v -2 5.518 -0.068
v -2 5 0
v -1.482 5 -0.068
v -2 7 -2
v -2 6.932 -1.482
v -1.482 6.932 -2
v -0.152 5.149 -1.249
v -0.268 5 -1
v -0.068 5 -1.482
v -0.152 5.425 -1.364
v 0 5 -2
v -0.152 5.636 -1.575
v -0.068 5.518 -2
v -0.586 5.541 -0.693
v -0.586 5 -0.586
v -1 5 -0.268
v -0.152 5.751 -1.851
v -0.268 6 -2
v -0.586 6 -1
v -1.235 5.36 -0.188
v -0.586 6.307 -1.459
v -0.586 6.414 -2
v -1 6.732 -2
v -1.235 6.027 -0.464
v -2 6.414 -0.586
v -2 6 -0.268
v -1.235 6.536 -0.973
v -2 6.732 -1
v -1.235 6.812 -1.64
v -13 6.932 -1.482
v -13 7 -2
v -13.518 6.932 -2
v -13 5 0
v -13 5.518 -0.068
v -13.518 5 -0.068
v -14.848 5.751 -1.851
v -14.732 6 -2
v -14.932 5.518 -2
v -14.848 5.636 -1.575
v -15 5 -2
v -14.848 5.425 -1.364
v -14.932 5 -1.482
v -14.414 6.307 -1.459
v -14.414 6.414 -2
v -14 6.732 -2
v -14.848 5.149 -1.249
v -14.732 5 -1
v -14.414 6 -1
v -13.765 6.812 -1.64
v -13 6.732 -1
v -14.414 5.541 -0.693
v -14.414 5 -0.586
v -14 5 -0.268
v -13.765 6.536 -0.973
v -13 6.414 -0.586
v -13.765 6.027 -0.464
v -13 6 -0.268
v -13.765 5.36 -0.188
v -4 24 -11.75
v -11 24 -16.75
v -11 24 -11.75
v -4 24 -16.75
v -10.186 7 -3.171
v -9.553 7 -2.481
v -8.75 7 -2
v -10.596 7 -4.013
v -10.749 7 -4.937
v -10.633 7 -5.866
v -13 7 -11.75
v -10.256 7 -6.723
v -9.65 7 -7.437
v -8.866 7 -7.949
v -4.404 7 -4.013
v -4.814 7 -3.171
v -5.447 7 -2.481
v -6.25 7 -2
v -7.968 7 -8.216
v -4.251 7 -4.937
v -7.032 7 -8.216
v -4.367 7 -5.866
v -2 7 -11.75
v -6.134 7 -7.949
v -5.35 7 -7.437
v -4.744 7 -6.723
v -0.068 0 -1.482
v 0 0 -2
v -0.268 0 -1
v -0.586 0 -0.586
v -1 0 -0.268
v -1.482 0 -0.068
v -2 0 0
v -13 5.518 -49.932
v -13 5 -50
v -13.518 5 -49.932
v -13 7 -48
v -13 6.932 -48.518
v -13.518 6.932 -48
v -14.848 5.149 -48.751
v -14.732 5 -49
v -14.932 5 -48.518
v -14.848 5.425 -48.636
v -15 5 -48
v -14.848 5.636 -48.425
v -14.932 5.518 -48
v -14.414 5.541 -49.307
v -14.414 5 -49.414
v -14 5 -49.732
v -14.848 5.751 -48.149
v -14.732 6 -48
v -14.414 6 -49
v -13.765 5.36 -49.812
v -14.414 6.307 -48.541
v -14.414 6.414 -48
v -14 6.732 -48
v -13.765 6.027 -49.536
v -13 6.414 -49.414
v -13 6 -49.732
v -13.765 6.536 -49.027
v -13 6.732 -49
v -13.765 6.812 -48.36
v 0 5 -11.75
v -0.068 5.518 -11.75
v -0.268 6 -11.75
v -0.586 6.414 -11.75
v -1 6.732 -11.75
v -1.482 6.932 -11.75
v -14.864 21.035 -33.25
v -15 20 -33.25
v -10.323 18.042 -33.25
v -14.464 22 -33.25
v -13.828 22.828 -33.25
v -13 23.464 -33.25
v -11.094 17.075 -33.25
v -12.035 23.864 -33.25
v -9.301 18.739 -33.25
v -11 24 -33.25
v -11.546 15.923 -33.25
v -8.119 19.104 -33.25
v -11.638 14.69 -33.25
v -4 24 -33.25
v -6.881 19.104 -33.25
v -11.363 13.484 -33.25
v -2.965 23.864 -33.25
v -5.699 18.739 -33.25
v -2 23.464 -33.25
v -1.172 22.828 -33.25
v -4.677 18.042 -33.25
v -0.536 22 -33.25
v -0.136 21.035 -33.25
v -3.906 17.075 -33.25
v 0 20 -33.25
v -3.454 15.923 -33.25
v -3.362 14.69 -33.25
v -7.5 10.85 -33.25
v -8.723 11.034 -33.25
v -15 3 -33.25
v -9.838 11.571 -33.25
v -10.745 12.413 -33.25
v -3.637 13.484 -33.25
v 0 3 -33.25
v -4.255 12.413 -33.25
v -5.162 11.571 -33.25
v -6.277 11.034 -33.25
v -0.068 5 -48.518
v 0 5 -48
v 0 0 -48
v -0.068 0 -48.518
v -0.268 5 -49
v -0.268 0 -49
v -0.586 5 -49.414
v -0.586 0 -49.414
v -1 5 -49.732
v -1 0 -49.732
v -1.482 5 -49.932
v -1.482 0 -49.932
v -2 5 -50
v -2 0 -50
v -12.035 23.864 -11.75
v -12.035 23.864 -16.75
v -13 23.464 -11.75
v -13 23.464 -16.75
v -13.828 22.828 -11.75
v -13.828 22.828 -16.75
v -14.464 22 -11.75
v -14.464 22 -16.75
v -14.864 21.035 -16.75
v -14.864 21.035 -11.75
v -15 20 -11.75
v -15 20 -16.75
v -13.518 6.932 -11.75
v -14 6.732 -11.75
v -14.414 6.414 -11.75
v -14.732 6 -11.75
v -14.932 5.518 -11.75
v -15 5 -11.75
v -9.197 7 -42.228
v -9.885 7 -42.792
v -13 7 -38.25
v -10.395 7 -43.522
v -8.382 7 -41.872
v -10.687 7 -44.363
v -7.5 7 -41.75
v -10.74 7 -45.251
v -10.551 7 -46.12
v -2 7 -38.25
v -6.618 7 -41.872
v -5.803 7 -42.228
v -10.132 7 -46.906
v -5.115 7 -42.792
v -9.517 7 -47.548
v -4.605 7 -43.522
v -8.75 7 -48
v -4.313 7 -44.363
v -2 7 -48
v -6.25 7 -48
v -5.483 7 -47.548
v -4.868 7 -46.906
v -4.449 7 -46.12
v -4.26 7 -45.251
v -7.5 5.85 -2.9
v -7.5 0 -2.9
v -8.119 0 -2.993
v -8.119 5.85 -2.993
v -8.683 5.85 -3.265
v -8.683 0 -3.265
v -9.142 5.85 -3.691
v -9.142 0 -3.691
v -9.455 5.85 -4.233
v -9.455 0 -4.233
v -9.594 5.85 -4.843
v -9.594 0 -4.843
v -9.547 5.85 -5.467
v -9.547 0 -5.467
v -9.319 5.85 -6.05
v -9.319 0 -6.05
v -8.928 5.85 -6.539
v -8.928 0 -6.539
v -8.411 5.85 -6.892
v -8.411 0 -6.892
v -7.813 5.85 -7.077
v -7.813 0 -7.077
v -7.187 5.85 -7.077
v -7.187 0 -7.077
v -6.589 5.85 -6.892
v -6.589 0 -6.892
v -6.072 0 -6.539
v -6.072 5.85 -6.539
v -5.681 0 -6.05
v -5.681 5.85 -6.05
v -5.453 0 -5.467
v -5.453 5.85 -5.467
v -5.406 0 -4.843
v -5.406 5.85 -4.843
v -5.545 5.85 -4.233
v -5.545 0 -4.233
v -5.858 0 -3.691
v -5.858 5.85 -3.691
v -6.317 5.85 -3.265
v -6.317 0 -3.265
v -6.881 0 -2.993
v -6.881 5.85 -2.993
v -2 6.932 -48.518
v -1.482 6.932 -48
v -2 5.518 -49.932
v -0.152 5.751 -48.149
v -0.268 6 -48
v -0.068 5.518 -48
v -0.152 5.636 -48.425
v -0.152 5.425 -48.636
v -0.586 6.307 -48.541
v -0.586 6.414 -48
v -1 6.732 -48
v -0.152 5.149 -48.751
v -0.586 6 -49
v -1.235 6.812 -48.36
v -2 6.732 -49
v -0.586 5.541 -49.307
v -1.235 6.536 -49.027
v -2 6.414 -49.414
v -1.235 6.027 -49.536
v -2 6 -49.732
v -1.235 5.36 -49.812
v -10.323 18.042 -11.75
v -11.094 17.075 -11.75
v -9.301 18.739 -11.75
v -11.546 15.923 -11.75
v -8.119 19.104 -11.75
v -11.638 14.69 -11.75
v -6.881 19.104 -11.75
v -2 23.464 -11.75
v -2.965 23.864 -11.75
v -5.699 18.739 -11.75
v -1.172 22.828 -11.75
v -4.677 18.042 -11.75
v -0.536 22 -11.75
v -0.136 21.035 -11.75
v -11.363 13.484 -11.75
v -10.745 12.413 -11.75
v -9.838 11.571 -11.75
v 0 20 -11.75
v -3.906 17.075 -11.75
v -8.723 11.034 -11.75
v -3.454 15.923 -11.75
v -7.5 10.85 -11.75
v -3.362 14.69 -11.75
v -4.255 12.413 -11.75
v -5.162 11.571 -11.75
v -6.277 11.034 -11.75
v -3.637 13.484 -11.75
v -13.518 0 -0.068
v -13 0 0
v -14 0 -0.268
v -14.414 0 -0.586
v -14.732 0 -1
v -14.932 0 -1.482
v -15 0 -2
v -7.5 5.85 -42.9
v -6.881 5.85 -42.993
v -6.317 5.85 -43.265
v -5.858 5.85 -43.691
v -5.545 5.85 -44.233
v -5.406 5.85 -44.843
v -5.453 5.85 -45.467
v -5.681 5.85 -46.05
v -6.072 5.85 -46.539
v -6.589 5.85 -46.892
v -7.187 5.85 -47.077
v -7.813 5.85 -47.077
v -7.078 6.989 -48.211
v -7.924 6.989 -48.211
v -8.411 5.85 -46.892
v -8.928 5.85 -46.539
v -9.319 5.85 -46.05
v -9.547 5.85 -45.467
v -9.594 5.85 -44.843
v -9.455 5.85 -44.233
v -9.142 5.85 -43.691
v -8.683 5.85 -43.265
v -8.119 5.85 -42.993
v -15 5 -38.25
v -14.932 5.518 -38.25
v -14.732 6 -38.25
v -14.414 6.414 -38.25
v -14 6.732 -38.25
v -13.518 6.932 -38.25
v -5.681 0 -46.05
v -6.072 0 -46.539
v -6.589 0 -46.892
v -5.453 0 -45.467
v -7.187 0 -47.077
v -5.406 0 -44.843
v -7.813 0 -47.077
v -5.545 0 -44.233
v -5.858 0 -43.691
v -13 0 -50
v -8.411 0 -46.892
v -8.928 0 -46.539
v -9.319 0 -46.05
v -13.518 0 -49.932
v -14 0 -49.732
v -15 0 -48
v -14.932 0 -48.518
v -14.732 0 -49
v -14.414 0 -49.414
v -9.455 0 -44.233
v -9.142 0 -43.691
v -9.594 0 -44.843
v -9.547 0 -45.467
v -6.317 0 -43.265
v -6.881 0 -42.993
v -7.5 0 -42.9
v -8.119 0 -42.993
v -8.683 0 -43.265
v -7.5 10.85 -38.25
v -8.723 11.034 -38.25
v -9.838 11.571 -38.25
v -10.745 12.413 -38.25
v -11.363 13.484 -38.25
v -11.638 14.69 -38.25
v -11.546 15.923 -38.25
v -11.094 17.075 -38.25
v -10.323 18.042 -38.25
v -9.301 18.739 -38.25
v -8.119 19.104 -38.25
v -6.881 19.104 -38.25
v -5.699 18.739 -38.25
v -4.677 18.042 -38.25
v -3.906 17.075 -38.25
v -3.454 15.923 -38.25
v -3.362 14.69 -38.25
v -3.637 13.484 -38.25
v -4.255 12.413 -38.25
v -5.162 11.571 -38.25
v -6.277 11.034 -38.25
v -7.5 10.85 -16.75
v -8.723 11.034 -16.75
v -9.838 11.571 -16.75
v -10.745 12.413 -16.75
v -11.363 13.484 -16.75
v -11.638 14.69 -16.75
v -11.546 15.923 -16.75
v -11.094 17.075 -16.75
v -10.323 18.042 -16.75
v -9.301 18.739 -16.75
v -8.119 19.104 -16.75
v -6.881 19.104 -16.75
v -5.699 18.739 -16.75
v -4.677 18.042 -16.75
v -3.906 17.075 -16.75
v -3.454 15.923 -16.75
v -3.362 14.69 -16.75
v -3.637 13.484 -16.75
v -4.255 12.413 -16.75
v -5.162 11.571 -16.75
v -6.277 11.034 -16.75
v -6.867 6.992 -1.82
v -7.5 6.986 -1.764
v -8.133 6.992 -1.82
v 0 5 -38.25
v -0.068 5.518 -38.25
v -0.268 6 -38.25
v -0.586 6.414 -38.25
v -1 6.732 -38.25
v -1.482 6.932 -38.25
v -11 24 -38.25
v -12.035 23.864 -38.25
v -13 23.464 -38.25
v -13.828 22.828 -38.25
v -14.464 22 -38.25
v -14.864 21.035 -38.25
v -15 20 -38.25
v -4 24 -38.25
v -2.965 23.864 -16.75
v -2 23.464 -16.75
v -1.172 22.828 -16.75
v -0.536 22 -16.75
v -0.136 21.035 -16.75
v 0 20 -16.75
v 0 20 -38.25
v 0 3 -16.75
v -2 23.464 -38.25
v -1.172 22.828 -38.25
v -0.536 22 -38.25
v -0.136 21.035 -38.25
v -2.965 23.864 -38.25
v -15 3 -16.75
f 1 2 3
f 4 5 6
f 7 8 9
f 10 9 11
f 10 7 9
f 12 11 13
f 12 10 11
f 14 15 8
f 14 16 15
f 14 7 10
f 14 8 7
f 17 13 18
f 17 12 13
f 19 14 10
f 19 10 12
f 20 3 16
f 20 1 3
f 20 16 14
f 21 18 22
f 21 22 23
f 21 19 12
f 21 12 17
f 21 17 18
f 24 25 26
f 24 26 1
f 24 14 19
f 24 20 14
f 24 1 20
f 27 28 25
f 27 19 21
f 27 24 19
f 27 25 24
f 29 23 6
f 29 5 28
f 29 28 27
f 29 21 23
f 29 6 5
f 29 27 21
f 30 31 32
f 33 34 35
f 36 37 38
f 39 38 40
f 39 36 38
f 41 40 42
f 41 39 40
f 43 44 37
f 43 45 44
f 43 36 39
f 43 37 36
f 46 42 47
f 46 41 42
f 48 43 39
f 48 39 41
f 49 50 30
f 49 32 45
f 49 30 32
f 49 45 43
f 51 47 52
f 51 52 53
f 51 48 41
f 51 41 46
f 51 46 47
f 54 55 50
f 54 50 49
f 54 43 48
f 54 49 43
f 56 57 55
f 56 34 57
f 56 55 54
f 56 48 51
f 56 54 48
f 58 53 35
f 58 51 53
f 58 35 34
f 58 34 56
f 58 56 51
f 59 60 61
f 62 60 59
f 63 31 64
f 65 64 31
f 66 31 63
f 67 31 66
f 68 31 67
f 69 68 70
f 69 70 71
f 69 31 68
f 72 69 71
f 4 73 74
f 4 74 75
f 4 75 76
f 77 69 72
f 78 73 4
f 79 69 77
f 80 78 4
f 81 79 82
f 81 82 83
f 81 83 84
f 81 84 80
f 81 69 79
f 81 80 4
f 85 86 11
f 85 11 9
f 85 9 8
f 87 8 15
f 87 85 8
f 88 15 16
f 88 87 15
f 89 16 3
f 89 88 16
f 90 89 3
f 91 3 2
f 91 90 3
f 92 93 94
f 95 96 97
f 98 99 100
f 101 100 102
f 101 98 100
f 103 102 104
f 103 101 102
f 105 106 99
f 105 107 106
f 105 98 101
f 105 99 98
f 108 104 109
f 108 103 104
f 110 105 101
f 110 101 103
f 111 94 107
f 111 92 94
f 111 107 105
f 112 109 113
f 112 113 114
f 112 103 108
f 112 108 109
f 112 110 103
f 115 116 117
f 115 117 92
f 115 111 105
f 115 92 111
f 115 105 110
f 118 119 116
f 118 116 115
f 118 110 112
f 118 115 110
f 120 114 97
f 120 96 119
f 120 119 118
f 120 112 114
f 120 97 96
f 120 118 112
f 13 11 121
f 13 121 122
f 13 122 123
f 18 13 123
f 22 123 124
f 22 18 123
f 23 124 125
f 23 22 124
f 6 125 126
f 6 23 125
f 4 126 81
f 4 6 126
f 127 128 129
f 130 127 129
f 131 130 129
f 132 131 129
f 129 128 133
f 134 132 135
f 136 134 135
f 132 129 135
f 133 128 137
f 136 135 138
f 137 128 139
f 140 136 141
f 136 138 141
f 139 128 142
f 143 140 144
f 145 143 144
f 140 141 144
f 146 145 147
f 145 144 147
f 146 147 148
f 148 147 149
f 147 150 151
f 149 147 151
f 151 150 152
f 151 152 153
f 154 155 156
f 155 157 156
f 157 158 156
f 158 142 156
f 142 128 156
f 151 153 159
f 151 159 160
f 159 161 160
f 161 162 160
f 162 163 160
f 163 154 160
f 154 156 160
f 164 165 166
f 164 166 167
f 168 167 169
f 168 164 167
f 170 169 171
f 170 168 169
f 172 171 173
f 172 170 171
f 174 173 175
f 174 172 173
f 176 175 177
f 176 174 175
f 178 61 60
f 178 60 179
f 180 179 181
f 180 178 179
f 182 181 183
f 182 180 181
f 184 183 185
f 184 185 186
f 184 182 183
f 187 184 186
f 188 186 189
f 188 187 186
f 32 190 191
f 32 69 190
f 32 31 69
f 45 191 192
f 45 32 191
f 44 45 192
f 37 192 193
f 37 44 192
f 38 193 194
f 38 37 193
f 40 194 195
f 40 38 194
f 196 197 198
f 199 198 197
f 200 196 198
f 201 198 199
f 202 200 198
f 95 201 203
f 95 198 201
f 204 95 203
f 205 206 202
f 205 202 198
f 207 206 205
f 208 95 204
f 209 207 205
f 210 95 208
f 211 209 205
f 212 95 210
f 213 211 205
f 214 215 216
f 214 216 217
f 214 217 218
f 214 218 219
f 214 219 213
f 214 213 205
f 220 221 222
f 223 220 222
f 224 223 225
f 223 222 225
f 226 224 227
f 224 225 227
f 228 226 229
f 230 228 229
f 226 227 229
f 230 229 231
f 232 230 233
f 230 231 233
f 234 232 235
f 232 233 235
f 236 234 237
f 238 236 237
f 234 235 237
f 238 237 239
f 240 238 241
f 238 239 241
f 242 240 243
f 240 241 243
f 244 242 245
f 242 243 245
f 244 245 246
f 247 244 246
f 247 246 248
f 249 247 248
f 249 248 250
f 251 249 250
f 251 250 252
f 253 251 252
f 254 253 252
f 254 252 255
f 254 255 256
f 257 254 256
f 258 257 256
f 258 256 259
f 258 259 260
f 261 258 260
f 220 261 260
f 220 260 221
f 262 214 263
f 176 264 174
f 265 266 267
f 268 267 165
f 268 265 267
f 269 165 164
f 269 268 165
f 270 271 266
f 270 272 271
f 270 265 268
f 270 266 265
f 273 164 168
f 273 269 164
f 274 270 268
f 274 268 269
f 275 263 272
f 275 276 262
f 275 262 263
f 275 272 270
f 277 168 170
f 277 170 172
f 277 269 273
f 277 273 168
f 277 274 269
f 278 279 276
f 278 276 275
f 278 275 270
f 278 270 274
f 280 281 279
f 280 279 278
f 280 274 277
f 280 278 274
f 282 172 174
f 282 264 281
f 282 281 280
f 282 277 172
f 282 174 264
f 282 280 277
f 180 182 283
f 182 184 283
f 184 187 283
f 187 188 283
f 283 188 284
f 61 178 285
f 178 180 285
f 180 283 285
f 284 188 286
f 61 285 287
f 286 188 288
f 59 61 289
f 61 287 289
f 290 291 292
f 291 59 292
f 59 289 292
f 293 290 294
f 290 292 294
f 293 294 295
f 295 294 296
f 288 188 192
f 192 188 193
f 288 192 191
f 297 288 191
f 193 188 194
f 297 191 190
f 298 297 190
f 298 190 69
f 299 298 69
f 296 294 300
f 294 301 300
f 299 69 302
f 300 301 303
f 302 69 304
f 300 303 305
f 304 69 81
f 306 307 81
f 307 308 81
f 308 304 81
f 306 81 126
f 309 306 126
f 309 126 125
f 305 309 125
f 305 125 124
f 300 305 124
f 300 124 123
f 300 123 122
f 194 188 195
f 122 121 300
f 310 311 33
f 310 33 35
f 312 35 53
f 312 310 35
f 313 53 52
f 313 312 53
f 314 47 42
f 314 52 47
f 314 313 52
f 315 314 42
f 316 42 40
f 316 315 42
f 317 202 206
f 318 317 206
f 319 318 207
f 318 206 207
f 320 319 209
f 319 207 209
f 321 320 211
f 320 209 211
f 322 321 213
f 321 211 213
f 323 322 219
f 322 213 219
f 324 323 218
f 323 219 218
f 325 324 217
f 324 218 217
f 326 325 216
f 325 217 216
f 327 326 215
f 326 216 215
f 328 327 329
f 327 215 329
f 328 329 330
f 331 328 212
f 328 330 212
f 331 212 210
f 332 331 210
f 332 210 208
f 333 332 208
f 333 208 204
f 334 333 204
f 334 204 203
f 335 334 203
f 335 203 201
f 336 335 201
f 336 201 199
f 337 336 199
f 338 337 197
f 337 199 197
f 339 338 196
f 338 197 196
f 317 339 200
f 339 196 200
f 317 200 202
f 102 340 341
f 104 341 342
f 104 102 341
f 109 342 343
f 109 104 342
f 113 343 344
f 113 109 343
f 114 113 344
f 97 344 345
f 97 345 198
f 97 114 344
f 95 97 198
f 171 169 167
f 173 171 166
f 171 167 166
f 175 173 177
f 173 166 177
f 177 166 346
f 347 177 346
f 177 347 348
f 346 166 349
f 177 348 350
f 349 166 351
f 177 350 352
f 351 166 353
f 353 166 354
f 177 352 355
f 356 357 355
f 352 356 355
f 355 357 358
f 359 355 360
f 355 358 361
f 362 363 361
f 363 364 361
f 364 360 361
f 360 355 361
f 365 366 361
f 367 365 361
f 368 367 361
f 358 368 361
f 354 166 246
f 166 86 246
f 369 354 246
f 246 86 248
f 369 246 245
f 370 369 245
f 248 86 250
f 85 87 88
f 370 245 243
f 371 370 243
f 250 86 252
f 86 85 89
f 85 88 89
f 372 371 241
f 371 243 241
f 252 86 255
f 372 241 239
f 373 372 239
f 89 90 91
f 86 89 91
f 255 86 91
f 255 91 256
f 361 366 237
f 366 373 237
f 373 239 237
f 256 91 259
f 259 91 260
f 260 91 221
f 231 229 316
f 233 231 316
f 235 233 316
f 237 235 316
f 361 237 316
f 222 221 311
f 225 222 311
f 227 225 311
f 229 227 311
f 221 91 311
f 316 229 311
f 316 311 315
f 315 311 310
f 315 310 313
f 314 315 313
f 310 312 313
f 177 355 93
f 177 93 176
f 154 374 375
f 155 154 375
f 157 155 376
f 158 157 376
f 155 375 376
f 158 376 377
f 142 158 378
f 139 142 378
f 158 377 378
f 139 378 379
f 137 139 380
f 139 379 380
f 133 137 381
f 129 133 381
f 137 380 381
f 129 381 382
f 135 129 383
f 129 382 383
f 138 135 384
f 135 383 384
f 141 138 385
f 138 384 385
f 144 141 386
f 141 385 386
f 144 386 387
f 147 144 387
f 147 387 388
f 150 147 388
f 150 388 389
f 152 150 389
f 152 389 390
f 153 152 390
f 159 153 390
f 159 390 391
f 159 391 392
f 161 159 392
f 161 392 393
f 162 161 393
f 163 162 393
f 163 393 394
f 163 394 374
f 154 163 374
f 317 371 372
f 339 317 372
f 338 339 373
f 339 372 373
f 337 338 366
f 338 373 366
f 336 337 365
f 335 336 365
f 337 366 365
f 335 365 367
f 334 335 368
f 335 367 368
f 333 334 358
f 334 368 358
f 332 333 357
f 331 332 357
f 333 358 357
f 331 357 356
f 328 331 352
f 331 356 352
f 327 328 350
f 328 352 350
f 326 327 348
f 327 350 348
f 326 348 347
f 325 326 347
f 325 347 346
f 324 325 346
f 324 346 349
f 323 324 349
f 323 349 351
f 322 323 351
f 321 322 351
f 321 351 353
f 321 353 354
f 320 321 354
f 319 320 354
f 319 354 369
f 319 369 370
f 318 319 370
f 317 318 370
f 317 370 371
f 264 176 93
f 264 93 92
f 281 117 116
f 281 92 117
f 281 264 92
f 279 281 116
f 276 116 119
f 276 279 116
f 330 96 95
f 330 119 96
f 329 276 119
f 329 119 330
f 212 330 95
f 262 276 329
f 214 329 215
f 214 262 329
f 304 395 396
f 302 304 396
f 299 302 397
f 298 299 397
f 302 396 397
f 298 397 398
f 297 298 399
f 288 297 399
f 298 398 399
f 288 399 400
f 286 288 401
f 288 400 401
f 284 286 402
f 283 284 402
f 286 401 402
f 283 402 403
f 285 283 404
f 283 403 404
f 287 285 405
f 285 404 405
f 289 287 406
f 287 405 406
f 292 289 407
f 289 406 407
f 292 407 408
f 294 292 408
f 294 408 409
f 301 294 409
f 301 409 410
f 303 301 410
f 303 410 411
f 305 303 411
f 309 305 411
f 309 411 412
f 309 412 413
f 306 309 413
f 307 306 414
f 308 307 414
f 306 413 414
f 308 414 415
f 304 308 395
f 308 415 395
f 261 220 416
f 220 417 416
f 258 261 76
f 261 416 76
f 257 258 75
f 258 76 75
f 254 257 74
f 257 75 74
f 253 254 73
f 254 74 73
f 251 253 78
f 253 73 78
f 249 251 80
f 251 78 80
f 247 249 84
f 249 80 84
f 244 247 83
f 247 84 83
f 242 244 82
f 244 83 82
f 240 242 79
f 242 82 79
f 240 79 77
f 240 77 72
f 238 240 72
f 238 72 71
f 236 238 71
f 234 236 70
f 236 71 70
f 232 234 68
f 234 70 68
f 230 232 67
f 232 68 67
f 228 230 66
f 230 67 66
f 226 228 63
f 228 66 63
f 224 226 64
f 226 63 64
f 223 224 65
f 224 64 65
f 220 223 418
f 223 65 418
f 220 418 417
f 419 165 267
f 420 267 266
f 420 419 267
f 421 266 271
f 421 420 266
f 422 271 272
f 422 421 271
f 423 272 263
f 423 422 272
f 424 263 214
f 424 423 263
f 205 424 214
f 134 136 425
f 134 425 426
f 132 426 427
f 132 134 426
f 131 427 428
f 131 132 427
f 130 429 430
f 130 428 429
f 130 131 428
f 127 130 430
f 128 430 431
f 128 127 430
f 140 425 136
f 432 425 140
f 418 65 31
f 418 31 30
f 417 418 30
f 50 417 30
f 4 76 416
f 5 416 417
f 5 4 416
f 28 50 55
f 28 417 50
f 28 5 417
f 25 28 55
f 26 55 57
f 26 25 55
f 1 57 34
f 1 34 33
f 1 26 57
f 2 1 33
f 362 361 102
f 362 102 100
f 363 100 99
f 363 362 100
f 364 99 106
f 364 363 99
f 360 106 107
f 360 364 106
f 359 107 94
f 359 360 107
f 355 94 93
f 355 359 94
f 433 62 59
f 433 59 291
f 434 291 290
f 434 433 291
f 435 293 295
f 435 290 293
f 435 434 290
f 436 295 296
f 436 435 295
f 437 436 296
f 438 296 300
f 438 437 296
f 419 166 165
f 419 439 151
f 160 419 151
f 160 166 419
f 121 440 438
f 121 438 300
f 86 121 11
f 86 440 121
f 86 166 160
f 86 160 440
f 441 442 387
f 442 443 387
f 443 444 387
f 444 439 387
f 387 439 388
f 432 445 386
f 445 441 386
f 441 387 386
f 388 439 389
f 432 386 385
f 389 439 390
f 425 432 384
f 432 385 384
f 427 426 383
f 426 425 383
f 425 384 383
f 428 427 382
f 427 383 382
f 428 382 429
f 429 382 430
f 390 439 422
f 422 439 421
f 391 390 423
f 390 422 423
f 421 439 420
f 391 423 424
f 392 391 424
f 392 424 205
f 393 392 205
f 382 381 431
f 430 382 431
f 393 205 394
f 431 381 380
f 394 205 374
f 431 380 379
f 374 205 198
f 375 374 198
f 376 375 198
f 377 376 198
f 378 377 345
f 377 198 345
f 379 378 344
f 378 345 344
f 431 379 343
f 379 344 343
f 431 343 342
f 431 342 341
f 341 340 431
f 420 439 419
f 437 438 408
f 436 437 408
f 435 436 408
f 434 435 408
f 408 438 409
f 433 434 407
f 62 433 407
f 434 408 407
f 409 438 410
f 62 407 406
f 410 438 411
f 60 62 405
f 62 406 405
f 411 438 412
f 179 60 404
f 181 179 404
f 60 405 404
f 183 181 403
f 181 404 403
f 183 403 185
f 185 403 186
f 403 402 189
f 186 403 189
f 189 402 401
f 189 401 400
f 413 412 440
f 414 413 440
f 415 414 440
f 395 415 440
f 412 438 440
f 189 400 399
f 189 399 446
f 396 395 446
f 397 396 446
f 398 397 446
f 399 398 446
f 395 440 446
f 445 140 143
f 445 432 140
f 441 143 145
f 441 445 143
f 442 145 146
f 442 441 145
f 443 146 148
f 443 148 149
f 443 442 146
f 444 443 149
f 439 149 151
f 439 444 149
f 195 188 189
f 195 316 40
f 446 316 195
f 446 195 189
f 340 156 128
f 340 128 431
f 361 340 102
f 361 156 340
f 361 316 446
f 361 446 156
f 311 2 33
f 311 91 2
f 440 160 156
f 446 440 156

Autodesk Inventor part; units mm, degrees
ref_plane "YZ Plane" through (0, 0, 0) normal (1, 0, 0) x (0, 1, 0)
ref_plane "XZ Plane" through (0, 0, 0) normal (0, 1, 0) x (-1, 0, 0)
ref_plane "XY Plane" through (0, 0, 0) normal (0, 0, 1) x (1, 0, 0)
sketch "Esquisse1" plane through (0, 0, 0) normal (0, 1, 0) x (-1, 0, 0)
  line L0 (0, 0) -> (15, 0)
  line L1 (15, 0) -> (15, -50)
  line L2 (15, -50) -> (0, -50)
  line L3 (0, -50) -> (0, 0)
  dimension "d0" = 50
  dimension "d1" = 15
extrude "Extrusion1" add sketch "Esquisse1" along normal blind 3
sketch "Esquisse2" plane through (0, 3, 0) normal (0, 1, 0) x (1, 0, 0)
  line L0 (-15, 50) -> (-15, 0) projected
  line L1 (-15, 11.75) -> (0, 11.75)
  line L2 (0, 11.75) -> (0, 38.25)
  line L3 (0, 38.25) -> (-15, 38.25)
  line L4 (-15, 38.25) -> (-15, 11.75)
  line L5 (-15, 0) -> (0, 0) projected
  line L6 (0, 50) -> (-15, 50) projected
  line L7 (-15, 11.75) -> (0, 11.75)
  line L8 (0, 11.75) -> (0, 16.75)
  line L9 (0, 16.75) -> (-15, 16.75)
  line L10 (-15, 16.75) -> (-15, 11.75)
  line L11 (-15, 33.25) -> (0, 33.25)
  line L12 (0, 33.25) -> (0, 38.25)
  line L13 (0, 38.25) -> (-15, 38.25)
  line L14 (-15, 38.25) -> (-15, 33.25)
  dimension "d4" = 15
  dimension "d5" = 11.75
  dimension "d6" = 11.75
  dimension "d7" = 5
  dimension "d8" = 5
extrude "Extrusion2" add sketch "Esquisse2" along normal blind 21 contours L3 L2 L11 L0 | L9 L2 L1 L0
sketch "Esquisse3" plane through (-15, 3, -11.75) normal (0, 0, 1) x (1, 0, 0)
  line L0 (0, 0) -> (15, 0) projected
  line L1 (0, 0) -> (0, 21) projected
  point P0 (15, -3)
  point P1 (7.5, 12)
  dimension "d11" = 12
  dimension "d12" = 7.5
hole "Perçage1" at (-7.5, 15, -11.75) direction (0, 0, -1) diameter 8.3 depth 100 tip angle 118
fillet "Congé1" radius 4 1 edges at (0, 24, -14.25)
fillet "Congé2" radius 4 1 edges at (-15, 24, -14.25)
fillet "Congé3" radius 4 1 edges at (-15, 24, -35.75)
fillet "Congé4" radius 4 1 edges at (0, 24, -35.75)
sketch "Esquisse4" plane through (0, 3, 0) normal (0, 1, 0) x (1, 0, 0)
  line L0 (0, 50) -> (0, 0) projected
  line L1 (-15, 0) -> (0, 0)
  line L2 (0, 0) -> (0, 11.75)
  line L3 (0, 11.75) -> (-15, 11.75)
  line L4 (-15, 11.75) -> (-15, 0)
  line L5 (-15, 0) -> (-15, 50) projected
  line L6 (-15, 38.25) -> (0, 38.25) projected
  line L7 (-15, 50) -> (0, 50)
  line L8 (0, 50) -> (0, 38.25)
  line L9 (0, 38.25) -> (-15, 38.25)
  line L10 (-15, 38.25) -> (-15, 50)
  dimension "d24" = 11.75
  dimension "d25" = 15
extrude "Extrusion3" add sketch "Esquisse4" along normal blind 4 contours L0 L6 L5 L7 | L0 L1 L4 L3
fillet "Congé5" radius 2 1 edges at (-7.5, 7, 0)
fillet "Congé6" radius 2 1 edges at (-7.5, 7, -50)
fillet "Congé7" radius 2 3 edges at (0, 7, -43.125) (0, 6.4142, -49.4142) (0, 2.5, -50)
fillet "Congé8" radius 2 3 edges at (0, 7, -6.875) (0, 6.4142, -0.5858) (0, 2.5, 0)
fillet "Congé9" radius 2 3 edges at (-15, 7, -6.875) (-15, 6.4142, -0.5858) (-15, 2.5, 0)
fillet "Congé10" radius 2 3 edges at (-15, 7, -43.125) (-15, 6.4142, -49.4142) (-15, 2.5, -50)
sketch "Esquisse5" plane through (0, 7, 0) normal (0, 1, 0) x (1, 0, 0)
  line L0 (-2, 50) -> (-13, 50) projected
  line L1 (0, 38.25) -> (0, 48) projected
  line L2 (0, 2) -> (0, 11.75) projected
  line L3 (-13, 0) -> (-2, 0) projected
  point P0 (0, 0)
  point P1 (-7.5, 45)
  point P2 (-7.5, 5)
  dimension "d34" = 5
  dimension "d35" = 7.5
  dimension "d36" = 7.5
  dimension "d37" = 5
hole "Perçage2" at (-7.5, 7, -45) at (-7.5, 7, -5) direction (0, -1, 0) diameter 4.2 depth 100 tip angle 118 countersink diameter 6.5 countersink angle 90
properties part number "support_roue_bascule"
